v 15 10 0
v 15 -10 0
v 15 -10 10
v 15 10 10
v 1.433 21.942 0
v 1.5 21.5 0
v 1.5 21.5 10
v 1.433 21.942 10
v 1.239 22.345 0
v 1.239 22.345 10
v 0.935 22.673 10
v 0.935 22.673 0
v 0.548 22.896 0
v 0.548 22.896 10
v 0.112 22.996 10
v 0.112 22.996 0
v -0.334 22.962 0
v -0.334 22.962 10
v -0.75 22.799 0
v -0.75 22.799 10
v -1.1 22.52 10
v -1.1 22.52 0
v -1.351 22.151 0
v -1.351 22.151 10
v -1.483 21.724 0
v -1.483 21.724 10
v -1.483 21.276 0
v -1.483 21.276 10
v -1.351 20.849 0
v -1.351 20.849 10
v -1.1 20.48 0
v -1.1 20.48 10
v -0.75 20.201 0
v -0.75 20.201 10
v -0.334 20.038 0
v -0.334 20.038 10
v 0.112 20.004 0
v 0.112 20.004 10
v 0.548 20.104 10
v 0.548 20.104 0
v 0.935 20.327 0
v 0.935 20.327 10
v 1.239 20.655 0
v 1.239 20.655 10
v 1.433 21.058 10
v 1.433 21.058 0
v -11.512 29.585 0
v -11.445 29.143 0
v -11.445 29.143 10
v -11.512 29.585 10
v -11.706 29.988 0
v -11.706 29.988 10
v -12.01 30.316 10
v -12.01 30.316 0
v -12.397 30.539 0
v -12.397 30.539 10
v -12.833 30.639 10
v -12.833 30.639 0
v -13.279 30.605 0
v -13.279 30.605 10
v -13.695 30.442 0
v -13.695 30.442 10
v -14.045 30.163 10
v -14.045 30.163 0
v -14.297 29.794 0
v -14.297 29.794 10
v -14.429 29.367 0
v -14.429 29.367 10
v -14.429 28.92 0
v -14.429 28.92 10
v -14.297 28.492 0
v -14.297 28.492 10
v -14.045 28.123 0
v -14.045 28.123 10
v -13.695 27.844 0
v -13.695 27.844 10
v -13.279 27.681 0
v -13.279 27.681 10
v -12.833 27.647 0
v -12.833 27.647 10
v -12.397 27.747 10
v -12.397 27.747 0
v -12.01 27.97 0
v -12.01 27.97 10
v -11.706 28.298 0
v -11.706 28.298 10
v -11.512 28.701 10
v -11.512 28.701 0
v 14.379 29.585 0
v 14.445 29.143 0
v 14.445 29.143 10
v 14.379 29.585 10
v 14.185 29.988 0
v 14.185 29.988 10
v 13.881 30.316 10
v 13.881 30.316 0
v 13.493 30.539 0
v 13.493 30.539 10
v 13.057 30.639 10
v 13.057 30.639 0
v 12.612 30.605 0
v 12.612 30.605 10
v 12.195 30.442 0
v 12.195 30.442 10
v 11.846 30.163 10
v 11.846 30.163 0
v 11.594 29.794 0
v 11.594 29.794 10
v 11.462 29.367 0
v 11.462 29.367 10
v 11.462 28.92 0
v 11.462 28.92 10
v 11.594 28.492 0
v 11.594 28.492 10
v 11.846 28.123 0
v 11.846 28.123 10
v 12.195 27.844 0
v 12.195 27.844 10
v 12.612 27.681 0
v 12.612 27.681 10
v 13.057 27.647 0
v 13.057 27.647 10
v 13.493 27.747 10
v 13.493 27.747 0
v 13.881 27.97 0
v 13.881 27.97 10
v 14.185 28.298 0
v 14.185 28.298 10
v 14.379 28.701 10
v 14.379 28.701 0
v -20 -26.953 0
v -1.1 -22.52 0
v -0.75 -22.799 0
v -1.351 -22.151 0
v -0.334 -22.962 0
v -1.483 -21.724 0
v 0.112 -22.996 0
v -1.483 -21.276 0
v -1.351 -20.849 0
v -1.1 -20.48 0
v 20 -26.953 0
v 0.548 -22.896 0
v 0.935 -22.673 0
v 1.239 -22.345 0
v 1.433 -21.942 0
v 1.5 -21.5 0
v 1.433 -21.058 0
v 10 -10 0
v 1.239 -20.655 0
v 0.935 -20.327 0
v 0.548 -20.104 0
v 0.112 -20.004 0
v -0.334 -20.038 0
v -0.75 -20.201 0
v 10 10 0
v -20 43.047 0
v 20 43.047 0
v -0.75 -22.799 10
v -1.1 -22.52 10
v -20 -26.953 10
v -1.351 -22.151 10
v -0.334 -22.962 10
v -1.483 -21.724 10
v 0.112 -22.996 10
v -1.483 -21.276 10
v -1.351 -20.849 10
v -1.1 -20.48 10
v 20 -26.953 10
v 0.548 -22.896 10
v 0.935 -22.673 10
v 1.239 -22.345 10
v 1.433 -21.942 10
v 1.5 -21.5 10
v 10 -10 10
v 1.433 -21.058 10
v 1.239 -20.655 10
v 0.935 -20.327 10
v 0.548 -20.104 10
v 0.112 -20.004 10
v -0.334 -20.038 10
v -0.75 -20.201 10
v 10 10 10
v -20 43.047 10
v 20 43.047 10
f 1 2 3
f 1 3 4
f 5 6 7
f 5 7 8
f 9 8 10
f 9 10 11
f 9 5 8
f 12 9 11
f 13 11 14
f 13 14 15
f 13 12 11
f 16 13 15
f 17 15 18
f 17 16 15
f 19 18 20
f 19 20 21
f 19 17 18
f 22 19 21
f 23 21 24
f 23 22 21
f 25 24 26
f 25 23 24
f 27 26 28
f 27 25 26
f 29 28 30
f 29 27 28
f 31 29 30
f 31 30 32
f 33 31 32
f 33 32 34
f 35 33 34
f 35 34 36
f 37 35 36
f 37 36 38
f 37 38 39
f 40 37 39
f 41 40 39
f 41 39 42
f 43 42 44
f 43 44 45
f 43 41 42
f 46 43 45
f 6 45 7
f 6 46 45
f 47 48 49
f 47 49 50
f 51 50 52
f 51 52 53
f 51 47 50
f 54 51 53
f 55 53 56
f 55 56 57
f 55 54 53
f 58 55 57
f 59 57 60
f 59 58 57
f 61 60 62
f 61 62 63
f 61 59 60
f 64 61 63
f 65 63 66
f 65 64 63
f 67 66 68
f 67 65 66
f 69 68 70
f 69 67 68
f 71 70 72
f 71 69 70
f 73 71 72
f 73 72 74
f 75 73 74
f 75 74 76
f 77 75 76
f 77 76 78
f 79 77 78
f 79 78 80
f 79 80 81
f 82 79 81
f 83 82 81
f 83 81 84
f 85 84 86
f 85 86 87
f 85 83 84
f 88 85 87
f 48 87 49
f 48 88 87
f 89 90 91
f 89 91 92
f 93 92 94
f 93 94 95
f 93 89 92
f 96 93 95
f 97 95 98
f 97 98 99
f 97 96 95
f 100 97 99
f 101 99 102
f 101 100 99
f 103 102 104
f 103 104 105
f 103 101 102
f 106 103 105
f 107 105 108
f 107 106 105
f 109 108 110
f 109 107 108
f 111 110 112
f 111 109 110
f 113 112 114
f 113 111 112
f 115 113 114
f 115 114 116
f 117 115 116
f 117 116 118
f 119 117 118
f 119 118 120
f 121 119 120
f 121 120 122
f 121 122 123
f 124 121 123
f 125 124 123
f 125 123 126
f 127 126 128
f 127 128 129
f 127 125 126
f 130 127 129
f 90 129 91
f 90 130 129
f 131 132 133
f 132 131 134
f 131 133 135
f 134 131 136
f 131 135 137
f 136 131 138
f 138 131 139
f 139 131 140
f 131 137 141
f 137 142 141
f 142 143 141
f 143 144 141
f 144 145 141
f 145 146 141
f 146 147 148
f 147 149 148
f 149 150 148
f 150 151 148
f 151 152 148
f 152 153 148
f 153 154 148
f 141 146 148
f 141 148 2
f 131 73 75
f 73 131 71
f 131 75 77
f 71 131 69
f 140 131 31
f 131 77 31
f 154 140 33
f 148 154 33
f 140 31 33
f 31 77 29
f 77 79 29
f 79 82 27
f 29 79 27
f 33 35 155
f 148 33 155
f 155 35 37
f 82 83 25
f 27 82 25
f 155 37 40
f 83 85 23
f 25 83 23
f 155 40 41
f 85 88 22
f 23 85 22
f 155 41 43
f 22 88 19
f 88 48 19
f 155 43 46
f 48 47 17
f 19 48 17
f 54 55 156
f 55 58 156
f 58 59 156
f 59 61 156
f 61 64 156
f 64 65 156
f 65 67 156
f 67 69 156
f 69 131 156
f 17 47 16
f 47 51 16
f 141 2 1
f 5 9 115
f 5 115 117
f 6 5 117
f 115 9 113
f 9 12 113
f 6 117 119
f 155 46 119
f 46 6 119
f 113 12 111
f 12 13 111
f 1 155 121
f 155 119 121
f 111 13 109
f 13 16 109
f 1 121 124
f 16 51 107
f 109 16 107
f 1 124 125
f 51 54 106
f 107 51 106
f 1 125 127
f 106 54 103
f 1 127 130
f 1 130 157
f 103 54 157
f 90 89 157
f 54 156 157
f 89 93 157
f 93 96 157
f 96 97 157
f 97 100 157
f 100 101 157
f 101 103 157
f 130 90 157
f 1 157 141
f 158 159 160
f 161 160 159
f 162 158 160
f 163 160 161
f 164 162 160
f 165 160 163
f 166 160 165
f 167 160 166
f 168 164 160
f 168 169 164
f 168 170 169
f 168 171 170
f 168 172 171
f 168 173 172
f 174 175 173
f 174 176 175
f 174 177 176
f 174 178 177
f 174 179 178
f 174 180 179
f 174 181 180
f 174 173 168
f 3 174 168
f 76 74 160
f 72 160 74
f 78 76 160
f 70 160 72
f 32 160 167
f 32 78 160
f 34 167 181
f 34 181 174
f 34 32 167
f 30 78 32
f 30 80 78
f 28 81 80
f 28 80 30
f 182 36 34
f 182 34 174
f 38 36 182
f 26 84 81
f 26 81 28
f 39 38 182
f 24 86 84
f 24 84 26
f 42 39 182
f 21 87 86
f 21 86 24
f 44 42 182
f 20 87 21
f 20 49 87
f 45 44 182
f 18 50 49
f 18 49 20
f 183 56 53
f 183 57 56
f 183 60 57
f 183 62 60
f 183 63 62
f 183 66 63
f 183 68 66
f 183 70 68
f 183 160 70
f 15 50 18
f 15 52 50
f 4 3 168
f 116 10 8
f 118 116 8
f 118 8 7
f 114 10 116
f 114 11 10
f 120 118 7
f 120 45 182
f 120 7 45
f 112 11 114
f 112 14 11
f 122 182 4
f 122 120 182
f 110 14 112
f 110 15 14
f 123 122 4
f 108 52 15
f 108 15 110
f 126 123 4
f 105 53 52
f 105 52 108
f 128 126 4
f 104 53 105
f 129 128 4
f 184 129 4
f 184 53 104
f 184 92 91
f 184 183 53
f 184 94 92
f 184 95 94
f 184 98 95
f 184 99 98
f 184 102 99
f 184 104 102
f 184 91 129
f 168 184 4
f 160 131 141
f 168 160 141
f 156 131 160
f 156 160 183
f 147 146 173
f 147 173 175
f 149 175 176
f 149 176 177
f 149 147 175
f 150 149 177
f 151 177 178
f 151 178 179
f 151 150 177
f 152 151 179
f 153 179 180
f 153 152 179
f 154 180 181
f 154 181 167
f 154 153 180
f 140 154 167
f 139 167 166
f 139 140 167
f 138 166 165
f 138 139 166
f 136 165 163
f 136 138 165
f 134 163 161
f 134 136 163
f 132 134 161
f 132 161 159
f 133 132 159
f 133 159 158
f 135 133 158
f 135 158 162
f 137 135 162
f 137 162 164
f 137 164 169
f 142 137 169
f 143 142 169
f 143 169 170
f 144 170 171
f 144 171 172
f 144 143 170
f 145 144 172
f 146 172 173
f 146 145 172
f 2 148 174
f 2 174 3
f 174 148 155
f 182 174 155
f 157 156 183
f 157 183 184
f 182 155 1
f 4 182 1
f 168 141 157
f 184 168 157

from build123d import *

# Parameters (mm, degrees)
SKETCH_1_W      = 40
SKETCH_1_H      = 70
SKETCH_1_R      = 1.5
SKETCH_1_W_2    = 5
SKETCH_1_H_2    = 20
EXTRUDE_1_DEPTH = 10


with BuildPart() as part:
    # 草圖1 → 伸長1 (new body)
    with BuildSketch(Plane.XY):
        with Locations((0, 8.046617977)):
            Rectangle(SKETCH_1_W, SKETCH_1_H)
        with Locations((12.945335117, 29.143070151)):
            Circle(SKETCH_1_R, mode=Mode.SUBTRACT)
        with Locations((-12.945335117, 29.143070151)):
            Circle(SKETCH_1_R, mode=Mode.SUBTRACT)
        with Locations((0, -21.5)):
            Circle(SKETCH_1_R, mode=Mode.SUBTRACT)
        with Locations((0, 21.5)):
            Circle(SKETCH_1_R, mode=Mode.SUBTRACT)
        with Locations((12.5, 0)):
            Rectangle(SKETCH_1_W_2, SKETCH_1_H_2, mode=Mode.SUBTRACT)
    extrude(amount=EXTRUDE_1_DEPTH)


solid = part.part
